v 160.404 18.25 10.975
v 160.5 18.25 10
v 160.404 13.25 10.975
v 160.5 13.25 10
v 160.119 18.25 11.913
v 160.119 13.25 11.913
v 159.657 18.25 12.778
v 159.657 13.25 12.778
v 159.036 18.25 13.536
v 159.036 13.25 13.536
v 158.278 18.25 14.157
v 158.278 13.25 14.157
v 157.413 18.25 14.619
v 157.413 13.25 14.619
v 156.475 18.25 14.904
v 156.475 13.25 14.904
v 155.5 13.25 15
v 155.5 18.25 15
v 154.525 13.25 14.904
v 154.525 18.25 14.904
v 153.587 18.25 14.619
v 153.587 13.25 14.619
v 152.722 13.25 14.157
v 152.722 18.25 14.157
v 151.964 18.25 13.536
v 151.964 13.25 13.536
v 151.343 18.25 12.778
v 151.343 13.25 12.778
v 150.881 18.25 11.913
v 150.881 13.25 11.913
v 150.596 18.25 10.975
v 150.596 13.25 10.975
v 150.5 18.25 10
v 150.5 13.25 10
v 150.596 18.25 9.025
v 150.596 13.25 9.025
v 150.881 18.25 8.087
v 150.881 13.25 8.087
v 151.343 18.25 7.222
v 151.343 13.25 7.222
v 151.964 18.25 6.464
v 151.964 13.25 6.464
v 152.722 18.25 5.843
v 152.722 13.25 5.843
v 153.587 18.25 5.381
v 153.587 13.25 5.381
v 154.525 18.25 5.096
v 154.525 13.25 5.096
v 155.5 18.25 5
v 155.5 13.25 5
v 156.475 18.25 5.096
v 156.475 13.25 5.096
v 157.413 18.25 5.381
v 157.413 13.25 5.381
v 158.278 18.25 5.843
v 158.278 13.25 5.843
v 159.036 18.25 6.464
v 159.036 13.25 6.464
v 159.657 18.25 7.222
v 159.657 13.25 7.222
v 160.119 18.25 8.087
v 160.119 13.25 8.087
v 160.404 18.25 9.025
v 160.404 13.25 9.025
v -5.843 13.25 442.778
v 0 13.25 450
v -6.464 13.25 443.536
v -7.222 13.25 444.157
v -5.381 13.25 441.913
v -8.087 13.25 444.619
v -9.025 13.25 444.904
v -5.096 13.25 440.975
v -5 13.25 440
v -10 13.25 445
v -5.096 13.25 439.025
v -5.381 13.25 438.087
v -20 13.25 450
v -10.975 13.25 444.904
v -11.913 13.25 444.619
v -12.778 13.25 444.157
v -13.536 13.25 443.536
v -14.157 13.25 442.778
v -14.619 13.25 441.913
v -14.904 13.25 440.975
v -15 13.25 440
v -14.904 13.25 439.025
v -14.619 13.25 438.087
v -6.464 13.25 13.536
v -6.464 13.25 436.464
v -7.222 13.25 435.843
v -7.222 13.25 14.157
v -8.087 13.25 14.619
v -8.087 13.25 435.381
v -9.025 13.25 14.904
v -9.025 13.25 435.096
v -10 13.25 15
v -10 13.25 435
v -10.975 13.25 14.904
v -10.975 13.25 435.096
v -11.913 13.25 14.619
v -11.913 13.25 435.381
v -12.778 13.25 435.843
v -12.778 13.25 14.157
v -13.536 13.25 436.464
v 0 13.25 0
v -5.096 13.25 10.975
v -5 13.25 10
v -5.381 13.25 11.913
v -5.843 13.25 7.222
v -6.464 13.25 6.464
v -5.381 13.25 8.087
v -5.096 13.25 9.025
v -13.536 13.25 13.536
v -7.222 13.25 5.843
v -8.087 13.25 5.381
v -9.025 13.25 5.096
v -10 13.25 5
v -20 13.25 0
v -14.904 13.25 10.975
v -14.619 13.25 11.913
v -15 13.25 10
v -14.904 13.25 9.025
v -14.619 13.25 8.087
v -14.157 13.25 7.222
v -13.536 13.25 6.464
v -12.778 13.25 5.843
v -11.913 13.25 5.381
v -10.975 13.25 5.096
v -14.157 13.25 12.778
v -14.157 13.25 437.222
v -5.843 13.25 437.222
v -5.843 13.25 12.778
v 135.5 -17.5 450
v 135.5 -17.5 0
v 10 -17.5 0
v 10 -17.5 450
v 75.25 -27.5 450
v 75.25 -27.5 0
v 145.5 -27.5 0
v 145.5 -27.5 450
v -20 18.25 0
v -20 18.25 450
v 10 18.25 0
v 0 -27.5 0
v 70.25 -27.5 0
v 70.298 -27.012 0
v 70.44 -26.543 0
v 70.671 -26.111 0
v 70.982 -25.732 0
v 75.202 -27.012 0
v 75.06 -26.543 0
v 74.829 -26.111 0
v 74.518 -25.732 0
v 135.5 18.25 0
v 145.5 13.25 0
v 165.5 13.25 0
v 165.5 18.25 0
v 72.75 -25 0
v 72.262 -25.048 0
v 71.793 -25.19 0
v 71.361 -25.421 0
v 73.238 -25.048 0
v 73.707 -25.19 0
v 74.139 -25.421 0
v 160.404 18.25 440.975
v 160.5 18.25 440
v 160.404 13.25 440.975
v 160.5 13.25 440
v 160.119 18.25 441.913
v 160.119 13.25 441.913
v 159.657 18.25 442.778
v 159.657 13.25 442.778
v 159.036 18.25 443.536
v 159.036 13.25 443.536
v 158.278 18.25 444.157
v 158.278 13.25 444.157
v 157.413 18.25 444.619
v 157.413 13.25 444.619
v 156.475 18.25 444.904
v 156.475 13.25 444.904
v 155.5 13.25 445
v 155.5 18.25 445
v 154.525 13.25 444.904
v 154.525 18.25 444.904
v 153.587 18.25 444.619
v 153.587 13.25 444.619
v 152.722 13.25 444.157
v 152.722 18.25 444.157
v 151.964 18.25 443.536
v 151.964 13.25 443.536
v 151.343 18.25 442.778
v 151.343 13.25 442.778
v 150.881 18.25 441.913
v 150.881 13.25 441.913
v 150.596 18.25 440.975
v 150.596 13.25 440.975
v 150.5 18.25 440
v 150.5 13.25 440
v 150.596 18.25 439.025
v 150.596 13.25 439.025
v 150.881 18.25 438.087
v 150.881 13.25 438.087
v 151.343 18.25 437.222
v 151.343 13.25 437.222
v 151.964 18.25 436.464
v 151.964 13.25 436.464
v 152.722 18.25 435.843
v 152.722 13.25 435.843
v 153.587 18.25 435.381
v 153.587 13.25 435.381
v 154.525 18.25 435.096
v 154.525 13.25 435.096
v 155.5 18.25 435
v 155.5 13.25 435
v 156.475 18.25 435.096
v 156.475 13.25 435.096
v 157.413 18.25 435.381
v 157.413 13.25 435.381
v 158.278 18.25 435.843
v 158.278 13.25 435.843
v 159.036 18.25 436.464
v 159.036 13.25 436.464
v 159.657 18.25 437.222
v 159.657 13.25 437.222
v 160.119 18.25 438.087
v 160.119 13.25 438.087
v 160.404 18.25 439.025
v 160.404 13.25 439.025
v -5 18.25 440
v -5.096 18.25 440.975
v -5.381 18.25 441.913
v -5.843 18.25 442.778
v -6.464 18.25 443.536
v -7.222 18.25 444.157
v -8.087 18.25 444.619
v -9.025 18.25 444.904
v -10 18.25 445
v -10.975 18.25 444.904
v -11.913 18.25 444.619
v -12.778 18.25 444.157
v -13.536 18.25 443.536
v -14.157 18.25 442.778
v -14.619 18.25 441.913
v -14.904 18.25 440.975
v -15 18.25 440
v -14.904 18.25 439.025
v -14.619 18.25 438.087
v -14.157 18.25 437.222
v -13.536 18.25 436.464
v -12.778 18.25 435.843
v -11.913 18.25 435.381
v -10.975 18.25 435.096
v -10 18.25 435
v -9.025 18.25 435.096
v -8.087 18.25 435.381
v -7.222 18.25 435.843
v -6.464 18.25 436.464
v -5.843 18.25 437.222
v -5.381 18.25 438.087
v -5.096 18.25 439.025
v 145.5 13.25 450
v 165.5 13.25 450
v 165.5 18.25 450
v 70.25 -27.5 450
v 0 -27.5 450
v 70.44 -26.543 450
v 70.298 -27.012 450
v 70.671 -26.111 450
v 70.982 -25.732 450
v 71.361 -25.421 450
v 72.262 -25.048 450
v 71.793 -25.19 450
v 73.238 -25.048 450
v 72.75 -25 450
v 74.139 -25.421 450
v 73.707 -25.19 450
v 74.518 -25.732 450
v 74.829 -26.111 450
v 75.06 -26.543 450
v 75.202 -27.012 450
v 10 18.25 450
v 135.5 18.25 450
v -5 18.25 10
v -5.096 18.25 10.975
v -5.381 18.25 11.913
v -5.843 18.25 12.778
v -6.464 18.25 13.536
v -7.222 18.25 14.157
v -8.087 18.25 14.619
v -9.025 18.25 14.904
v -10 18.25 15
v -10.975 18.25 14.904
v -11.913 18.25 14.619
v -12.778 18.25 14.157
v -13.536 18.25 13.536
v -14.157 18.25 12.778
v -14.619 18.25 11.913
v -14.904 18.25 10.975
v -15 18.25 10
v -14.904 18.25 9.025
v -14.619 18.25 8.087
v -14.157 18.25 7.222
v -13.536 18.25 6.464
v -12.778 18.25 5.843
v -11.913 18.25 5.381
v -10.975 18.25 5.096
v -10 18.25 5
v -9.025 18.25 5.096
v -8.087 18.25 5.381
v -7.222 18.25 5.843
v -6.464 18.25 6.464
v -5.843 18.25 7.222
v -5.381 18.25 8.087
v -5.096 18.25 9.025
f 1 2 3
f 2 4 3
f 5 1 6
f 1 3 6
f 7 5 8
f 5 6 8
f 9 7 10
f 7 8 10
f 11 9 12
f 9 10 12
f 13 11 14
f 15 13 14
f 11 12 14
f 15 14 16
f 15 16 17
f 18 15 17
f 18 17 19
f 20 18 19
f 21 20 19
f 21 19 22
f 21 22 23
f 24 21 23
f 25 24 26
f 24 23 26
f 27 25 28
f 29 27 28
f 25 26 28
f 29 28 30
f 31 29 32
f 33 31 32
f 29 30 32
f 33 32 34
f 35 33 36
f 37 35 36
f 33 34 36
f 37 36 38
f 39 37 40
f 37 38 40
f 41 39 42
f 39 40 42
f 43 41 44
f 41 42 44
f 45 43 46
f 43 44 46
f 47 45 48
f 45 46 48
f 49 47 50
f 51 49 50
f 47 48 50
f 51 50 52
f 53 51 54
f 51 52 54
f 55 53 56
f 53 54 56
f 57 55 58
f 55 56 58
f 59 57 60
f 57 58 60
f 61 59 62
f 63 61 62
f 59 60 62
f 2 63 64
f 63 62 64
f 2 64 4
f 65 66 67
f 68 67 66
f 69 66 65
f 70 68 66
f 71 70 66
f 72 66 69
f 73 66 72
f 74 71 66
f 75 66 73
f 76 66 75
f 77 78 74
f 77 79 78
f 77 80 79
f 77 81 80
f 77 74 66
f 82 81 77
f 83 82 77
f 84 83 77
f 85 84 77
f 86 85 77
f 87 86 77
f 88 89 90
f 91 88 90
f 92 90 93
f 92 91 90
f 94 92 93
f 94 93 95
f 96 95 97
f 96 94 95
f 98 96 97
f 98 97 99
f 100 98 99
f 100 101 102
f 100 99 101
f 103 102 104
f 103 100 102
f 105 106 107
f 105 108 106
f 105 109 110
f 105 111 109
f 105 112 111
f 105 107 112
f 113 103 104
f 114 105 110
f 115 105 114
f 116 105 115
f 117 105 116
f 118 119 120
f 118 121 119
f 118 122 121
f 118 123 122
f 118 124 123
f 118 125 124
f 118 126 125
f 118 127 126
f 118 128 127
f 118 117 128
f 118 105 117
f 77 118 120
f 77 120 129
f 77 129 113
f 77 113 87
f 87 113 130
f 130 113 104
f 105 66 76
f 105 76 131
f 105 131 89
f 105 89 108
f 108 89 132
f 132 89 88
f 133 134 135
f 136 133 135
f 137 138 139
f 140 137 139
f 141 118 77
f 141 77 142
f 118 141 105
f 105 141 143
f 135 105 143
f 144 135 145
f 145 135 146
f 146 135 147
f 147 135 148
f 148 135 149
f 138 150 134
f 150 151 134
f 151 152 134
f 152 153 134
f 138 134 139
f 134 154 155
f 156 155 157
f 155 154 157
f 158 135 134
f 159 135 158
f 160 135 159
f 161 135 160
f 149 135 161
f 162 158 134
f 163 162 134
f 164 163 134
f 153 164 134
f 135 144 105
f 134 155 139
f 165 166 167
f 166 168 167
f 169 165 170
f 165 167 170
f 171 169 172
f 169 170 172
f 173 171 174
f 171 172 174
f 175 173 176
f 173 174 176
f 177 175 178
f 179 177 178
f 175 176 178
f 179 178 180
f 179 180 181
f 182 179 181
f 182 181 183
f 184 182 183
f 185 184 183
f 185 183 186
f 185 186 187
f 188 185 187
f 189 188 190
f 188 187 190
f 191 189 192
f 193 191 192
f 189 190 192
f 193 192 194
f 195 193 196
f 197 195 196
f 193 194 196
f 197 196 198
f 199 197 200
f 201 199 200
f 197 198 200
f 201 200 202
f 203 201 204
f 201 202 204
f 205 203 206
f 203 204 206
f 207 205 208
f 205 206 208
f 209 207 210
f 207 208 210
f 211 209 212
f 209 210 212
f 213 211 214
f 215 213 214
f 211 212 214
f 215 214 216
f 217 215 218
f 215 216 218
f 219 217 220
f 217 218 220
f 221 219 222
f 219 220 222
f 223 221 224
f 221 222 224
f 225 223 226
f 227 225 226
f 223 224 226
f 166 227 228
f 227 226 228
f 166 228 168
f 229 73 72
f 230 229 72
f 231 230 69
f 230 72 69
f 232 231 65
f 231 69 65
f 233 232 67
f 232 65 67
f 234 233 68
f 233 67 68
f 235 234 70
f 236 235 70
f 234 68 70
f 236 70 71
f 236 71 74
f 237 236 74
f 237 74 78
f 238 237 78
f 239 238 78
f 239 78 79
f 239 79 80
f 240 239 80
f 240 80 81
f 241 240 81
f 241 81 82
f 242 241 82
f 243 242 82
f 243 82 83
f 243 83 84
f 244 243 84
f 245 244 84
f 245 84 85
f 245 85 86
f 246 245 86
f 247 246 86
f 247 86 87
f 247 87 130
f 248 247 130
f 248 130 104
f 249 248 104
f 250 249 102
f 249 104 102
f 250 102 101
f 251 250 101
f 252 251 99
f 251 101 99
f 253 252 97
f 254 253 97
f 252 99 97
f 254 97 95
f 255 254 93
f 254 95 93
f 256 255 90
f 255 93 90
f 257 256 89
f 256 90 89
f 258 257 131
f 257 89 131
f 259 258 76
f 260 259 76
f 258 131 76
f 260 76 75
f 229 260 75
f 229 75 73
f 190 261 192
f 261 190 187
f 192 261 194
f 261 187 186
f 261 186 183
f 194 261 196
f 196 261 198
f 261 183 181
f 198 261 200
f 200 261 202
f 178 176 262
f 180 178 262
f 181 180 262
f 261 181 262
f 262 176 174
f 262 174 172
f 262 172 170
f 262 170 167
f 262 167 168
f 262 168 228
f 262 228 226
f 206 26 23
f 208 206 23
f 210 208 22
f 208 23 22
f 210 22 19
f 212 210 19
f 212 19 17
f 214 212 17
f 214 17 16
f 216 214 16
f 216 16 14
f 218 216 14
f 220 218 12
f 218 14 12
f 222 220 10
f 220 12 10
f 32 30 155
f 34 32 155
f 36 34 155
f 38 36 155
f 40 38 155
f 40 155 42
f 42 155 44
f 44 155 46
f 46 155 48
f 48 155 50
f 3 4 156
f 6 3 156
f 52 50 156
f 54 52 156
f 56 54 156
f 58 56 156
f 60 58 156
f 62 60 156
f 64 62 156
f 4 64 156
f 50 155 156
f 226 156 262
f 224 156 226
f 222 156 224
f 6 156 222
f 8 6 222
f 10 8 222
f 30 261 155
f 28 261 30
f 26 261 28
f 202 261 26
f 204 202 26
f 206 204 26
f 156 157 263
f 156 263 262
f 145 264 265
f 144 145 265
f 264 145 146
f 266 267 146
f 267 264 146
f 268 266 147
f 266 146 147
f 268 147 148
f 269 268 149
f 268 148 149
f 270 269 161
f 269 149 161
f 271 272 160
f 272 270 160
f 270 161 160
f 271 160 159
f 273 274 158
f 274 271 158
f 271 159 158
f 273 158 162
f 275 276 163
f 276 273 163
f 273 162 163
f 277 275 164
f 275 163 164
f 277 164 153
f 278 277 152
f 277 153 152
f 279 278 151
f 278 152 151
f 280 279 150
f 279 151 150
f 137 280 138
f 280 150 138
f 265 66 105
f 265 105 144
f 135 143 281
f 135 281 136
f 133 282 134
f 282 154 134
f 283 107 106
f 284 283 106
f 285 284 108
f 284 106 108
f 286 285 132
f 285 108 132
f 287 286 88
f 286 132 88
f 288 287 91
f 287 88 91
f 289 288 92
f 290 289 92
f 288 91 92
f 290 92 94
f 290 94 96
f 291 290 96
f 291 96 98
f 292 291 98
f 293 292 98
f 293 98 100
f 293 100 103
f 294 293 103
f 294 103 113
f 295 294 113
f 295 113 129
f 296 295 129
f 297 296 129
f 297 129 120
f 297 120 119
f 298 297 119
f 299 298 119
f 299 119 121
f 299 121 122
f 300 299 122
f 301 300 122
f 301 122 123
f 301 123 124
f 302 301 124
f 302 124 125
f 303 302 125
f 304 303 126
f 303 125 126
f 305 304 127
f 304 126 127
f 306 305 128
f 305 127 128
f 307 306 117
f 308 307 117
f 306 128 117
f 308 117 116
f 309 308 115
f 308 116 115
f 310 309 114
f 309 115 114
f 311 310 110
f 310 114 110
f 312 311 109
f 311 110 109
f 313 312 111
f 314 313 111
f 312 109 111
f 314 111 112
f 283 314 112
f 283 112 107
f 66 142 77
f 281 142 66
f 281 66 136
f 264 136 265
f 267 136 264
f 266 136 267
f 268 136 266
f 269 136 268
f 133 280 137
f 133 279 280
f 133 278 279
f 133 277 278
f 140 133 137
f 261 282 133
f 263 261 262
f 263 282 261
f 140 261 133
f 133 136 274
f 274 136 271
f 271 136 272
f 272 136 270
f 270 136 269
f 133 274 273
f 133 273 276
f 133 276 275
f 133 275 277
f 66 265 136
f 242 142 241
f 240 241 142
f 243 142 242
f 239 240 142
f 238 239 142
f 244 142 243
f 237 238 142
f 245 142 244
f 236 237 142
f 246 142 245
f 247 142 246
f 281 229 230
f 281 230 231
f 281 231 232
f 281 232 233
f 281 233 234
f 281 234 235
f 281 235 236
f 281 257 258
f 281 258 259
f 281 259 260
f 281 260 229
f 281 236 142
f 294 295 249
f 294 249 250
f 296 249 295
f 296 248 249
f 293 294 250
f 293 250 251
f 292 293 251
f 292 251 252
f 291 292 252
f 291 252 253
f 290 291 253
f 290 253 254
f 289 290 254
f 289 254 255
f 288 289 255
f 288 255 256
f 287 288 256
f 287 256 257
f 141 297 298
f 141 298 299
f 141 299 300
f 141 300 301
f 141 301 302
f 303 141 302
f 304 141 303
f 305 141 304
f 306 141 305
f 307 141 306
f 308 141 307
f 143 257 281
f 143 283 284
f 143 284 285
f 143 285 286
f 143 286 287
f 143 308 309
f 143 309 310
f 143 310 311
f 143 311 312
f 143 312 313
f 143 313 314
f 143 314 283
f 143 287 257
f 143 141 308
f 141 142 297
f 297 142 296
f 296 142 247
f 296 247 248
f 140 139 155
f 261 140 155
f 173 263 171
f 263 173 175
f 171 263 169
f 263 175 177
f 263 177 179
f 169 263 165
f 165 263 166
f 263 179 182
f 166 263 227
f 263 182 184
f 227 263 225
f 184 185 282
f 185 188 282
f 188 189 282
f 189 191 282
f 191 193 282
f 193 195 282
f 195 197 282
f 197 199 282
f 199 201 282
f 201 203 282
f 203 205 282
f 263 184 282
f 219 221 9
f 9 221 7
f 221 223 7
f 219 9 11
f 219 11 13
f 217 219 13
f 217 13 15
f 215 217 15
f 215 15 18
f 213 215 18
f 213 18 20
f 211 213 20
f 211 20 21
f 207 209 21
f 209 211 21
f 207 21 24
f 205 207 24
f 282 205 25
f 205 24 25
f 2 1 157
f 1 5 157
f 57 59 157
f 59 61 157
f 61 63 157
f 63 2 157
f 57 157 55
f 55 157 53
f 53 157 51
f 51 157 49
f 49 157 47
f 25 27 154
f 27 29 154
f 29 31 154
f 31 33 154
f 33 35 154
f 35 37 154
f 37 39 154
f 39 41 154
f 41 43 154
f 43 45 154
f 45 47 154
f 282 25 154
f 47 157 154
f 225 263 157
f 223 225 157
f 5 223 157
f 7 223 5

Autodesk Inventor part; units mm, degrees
ref_plane "YZ Plane" through (0, 0, 0) normal (1, 0, 0) x (0, 1, 0)
ref_plane "XZ Plane" through (0, 0, 0) normal (0, 1, 0) x (-1, 0, 0)
ref_plane "XY Plane" through (0, 0, 0) normal (0, 0, 1) x (1, 0, 0)
sketch "Sketch1" plane through (0, 0, 0) normal (0, 0, 1) x (1, 0, 0)
  line L0 (165.5, 18.25) -> (165.5, 13.25)
  line L1 (95.5, -27.5) -> (75.25, -27.5)
  arc A0 (75.25, -27.5) -> (70.25, -27.5) centre (72.75, -27.5) ccw
  line L2 (70.25, -27.5) -> (50, -27.5)
  line L3 (145.5, 0) -> (145.5, 13.25)
  line L4 (145.5, 13.25) -> (165.5, 13.25)
  line L5 (0, 13.25) -> (0, 0)
  line L6 (0, 13.25) -> (-20, 13.25)
  line L7 (-20, 13.25) -> (-20, 18.25)
  line L8 (-20, 18.25) -> (0, 18.25)
  line L9 (0, 18.25) -> (10, 18.25)
  line L10 (10, 18.25) -> (10, -17.5)
  line L11 (165.5, 18.25) -> (145.5, 18.25)
  line L12 (145.5, 18.25) -> (135.5, 18.25)
  line L13 (135.5, 18.25) -> (135.5, -17.5)
  line L14 (135.5, -17.5) -> (10, -17.5)
  line L15 (0, 0) -> (0, -27.5)
  line L16 (0, -27.5) -> (50, -27.5)
  line L17 (95.5, -27.5) -> (145.5, -27.5)
  line L18 (145.5, -27.5) -> (145.5, 0)
  point P0 (0, 0)
  dimension "d0" = 10
  dimension "d1" = 35.75
  dimension "d2" = 10
extrude "Extrusion1" add sketch "Sketch1" along normal blind 450
sketch "Sketch2" plane through (-20, 13.25, 0) normal (0, -1, 0) x (1, 0, 0)
  line L0 (30, 450) -> (0, 450) projected
  line L1 (20, 0) -> (20, 450) projected
  line L2 (0, 450) -> (20, 450)
  line L3 (20, 450) -> (20, 430)
  line L4 (20, 430) -> (0, 430)
  line L5 (0, 430) -> (0, 450)
  circle A0 centre (10, 440) radius 5
  line L6 (185.5, 0) -> (185.5, 450) projected
  line L7 (185.5, 450) -> (165.5, 450)
  line L8 (165.5, 450) -> (165.5, 430)
  line L9 (165.5, 430) -> (185.5, 430)
  line L10 (185.5, 430) -> (185.5, 450)
  line L11 (185.5, 0) -> (155.5, 0) projected
  line L12 (185.5, 0) -> (165.5, 0)
  line L13 (165.5, 0) -> (165.5, 20)
  line L14 (165.5, 20) -> (185.5, 20)
  line L15 (185.5, 20) -> (185.5, 0)
  line L16 (0, 0) -> (0, 450) projected
  line L17 (0, 0) -> (20, 0)
  line L18 (20, 0) -> (20, 20)
  line L19 (20, 20) -> (0, 20)
  line L20 (0, 20) -> (0, 0)
  circle A1 centre (175.5, 440) radius 5
  circle A2 centre (175.5, 10) radius 5
  circle A3 centre (10, 10) radius 5
  dimension "d5" = 20
  dimension "d6" = 10
  dimension "d7" = 20
  dimension "d8" = 20
  dimension "d9" = 20
  dimension "d10" = 20
  dimension "d11" = 20
  dimension "d12" = 20
  dimension "d13" = 10
  dimension "d14" = 10
  dimension "d15" = 10
extrude "Extrusion2" cut sketch "Sketch2" against normal blind 450 contours A0 | A1 | A2 | A3
properties part number "SoporteMaterial"
